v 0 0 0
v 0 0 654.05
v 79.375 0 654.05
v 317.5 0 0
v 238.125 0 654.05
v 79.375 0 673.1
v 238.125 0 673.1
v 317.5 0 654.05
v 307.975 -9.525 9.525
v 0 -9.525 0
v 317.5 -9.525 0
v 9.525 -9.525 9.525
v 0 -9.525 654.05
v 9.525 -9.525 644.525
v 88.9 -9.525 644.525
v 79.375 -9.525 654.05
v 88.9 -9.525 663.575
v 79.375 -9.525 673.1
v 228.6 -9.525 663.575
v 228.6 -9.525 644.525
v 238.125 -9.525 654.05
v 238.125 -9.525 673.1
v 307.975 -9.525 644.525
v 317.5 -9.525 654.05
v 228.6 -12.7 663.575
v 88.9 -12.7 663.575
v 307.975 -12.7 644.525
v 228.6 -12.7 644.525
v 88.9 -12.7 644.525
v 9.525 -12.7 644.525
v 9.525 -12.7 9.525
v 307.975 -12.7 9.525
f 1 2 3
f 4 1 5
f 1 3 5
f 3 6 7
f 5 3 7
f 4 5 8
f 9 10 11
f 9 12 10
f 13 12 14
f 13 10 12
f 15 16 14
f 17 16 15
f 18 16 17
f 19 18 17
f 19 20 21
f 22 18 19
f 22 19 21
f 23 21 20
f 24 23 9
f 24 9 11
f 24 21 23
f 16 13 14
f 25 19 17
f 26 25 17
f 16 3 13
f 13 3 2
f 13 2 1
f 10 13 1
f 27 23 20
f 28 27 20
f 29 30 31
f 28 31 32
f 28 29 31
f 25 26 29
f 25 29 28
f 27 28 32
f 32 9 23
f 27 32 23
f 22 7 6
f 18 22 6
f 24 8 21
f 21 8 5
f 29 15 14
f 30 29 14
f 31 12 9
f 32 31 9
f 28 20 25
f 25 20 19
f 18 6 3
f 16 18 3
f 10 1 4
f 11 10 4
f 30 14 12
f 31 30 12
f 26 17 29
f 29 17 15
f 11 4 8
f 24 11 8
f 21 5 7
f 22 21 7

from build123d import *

# Parameters (mm, degrees)
F1_DEPTH = 12.7
F2_DEPTH = 9.525


with BuildPart() as f1:
    # F0 (on Front) → F1 (new body)
    with BuildSketch(Plane.XZ):
        Polygon((228.6, 663.575), (88.9, 663.575), (88.9, 644.525), (9.525, 644.525), (9.525, 9.525), (307.975, 9.525), (307.975, 644.525), (228.6, 644.525), align=None)
    extrude(amount=F1_DEPTH)

    # F0 (on Front) → F2 (join)
    with BuildSketch(Plane.XZ):
        Polygon((0, 654.05), (0, 0), (317.5, 0), (317.5, 654.05), (238.125, 654.05), (238.125, 673.1), (79.375, 673.1), (79.375, 654.05), align=None)
        Polygon((88.9, 644.525), (88.9, 663.575), (228.6, 663.575), (228.6, 644.525), (307.975, 644.525), (307.975, 9.525), (9.525, 9.525), (9.525, 644.525), align=None, mode=Mode.SUBTRACT)
    extrude(amount=F2_DEPTH)


solid = f1.part
